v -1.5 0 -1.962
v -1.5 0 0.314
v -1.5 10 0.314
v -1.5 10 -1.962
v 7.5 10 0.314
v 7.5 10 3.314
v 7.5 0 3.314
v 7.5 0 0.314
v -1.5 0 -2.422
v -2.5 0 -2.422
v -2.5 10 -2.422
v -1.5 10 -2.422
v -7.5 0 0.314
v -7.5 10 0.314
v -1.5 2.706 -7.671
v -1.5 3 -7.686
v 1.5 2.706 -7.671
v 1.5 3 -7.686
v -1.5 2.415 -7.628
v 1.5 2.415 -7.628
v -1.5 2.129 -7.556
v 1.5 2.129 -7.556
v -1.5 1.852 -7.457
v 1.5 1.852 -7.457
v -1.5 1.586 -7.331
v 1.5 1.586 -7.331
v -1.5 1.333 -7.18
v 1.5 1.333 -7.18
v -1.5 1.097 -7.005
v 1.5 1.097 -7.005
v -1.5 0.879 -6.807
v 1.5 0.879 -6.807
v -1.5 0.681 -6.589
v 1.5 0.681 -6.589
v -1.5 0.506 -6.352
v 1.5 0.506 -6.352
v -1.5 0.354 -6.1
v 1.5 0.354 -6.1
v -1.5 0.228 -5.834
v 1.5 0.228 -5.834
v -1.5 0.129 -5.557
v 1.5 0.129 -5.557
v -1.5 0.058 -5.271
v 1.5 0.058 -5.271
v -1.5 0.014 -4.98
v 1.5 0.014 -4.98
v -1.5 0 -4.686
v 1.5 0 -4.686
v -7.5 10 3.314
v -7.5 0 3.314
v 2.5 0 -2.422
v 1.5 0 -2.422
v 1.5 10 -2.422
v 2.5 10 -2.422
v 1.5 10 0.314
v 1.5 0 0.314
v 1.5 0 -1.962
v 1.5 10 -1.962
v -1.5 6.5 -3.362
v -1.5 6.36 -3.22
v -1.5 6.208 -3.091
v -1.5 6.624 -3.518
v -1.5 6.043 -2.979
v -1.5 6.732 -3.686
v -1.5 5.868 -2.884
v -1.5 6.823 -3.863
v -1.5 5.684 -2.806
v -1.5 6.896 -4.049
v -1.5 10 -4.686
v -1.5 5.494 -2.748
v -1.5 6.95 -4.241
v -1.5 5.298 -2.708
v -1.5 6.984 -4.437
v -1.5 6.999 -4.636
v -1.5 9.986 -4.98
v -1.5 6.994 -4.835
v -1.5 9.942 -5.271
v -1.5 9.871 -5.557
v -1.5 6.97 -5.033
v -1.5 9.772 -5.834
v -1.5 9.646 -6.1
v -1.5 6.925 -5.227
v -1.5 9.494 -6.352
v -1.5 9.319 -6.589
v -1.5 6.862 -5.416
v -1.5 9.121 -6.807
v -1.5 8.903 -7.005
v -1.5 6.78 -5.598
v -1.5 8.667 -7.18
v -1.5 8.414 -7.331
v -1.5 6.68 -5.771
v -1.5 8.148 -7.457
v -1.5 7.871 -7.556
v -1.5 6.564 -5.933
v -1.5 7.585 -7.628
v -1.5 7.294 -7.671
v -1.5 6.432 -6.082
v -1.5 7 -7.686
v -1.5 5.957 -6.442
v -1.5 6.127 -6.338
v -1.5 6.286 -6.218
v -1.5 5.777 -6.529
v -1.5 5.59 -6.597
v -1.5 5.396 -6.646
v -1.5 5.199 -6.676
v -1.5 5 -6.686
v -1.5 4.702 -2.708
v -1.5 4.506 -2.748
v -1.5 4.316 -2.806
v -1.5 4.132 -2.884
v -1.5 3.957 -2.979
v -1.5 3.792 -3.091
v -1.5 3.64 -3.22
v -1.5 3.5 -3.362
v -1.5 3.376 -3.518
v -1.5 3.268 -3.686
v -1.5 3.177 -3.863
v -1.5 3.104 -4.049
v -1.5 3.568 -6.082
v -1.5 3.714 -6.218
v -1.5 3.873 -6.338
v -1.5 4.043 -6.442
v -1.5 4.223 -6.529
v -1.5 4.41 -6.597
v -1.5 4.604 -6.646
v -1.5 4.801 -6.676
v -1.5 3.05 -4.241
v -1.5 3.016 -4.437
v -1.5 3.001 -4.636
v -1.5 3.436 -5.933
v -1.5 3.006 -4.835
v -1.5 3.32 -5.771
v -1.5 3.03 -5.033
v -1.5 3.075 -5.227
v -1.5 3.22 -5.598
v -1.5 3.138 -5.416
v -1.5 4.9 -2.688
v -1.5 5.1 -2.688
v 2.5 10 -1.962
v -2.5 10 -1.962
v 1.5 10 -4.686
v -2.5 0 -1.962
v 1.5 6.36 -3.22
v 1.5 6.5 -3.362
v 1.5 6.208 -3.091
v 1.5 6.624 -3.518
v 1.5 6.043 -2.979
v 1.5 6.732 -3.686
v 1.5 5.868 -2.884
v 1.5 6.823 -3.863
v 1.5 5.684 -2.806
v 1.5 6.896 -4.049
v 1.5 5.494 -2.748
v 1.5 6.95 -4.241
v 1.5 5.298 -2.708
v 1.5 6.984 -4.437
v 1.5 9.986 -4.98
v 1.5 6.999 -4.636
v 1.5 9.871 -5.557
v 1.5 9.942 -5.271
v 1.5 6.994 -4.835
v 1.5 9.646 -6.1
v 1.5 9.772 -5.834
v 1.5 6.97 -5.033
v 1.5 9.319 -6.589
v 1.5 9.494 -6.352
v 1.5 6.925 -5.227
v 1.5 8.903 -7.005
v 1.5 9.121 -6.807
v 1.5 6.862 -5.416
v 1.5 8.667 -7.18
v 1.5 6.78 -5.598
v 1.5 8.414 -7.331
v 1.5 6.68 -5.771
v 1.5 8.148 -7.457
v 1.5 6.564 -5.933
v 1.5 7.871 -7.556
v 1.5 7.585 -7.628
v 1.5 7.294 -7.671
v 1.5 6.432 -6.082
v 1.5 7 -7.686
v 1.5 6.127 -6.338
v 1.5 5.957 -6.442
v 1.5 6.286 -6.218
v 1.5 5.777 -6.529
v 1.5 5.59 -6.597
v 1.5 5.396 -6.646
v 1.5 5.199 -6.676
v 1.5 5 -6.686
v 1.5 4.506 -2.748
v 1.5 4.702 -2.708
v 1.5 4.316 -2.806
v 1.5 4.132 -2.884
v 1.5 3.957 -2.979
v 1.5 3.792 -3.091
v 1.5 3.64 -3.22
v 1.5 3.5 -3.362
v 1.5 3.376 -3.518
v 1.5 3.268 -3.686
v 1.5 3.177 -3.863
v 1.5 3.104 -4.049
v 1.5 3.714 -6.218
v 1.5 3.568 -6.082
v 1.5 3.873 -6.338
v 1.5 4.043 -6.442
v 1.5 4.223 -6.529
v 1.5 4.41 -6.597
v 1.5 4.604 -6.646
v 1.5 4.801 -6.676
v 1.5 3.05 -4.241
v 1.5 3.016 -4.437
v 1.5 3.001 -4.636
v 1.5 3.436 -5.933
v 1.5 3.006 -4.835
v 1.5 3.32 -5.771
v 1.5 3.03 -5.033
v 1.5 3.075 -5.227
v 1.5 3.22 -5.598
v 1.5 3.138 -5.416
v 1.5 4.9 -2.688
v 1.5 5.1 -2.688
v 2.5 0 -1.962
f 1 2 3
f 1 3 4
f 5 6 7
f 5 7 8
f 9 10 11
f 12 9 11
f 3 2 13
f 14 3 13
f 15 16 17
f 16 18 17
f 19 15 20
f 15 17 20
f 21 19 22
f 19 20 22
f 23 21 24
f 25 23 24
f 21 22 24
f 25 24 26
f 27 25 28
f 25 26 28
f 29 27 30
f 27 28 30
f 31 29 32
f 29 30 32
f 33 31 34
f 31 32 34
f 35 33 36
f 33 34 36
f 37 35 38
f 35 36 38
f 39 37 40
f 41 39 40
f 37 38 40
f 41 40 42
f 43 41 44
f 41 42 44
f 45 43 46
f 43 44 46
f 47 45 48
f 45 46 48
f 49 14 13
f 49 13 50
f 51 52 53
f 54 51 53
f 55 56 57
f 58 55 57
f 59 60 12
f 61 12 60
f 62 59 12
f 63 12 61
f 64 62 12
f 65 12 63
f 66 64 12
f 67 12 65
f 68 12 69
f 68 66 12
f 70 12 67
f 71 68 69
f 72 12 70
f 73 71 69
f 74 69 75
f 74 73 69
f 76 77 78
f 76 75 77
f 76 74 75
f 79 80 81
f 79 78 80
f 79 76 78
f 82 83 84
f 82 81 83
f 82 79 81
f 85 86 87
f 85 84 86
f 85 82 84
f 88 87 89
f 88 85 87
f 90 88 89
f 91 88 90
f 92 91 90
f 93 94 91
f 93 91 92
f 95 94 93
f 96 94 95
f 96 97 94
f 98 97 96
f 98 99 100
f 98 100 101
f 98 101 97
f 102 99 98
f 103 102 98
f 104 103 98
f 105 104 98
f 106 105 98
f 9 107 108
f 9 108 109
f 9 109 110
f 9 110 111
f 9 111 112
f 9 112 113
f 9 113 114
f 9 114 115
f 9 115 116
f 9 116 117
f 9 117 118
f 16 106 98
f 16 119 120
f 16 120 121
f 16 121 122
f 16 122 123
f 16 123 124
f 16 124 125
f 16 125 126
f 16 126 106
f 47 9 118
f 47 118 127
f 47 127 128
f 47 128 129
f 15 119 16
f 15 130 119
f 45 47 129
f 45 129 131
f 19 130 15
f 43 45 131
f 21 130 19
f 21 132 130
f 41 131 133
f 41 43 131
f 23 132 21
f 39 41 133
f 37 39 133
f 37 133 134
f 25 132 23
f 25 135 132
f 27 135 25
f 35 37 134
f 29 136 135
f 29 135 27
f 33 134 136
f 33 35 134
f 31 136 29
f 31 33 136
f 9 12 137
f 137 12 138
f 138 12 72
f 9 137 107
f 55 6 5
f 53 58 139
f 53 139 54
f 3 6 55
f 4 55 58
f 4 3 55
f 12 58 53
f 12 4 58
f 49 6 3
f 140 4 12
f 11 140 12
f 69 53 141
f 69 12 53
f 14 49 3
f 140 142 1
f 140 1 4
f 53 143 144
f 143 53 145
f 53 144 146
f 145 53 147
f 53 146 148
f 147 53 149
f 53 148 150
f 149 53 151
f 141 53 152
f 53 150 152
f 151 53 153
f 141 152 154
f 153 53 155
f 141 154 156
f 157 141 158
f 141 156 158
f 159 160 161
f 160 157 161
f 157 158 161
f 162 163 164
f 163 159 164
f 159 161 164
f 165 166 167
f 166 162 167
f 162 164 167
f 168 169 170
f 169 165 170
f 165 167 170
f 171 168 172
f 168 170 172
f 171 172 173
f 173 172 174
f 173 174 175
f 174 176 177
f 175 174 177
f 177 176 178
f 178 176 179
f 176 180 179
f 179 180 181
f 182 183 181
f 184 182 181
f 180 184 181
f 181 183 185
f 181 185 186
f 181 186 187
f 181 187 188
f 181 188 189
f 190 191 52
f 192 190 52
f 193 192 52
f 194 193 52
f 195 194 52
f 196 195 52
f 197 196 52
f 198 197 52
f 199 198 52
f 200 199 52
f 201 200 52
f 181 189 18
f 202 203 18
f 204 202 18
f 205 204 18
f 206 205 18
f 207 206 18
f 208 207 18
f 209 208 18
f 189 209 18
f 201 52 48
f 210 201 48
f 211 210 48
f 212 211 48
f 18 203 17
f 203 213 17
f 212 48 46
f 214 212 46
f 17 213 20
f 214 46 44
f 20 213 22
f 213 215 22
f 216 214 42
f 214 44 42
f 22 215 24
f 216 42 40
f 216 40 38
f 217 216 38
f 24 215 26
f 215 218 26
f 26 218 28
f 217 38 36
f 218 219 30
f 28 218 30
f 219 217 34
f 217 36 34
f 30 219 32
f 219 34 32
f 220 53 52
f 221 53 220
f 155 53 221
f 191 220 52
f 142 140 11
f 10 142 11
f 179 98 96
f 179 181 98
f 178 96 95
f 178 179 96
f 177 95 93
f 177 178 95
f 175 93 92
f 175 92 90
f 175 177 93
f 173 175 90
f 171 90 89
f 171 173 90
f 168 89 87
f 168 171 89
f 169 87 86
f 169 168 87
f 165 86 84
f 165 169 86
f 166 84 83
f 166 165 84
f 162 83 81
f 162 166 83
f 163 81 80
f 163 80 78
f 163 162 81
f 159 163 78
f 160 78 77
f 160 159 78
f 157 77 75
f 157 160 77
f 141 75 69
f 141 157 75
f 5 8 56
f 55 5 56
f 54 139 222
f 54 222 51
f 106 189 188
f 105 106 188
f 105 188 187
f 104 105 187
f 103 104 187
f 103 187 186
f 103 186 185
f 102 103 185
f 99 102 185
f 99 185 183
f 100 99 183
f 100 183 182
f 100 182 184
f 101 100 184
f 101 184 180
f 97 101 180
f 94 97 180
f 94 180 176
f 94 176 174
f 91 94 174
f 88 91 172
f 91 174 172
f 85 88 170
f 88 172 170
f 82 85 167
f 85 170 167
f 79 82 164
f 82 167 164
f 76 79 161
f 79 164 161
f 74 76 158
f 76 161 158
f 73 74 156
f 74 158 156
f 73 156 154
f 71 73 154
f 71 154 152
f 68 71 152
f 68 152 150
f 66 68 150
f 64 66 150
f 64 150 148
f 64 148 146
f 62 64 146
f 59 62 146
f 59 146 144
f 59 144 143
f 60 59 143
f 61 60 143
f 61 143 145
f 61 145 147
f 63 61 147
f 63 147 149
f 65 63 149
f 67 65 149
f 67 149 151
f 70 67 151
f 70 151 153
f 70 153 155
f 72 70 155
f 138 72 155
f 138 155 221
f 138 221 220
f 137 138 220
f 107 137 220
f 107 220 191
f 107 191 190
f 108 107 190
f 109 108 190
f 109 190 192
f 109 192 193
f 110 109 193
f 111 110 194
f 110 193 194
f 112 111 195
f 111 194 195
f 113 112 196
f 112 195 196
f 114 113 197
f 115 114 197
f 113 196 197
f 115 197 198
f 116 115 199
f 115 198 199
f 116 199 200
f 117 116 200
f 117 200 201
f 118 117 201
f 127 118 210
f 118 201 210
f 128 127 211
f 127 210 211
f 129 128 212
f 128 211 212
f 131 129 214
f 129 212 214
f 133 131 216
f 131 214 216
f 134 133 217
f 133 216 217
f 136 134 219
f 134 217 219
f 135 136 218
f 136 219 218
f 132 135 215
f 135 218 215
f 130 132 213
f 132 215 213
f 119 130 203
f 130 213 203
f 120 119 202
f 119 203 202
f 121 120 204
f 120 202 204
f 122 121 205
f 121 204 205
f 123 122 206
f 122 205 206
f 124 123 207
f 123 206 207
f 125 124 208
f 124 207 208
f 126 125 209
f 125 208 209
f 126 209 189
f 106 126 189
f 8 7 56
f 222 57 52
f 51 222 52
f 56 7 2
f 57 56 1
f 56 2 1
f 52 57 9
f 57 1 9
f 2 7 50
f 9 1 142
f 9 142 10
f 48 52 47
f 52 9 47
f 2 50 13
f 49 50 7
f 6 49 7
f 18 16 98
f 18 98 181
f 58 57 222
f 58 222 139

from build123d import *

# Parameters (mm, degrees)
BOSS_EXTRUDE1_DEPTH      = 10
FILLET1_R                = 3
SKETCH2_R                = 2
CUT_EXTRUDE1_DEPTH       = 10
BOSS_EXTRUDE2_DEPTH      = 1
BOSS_EXTRUDE2_DEPTH_BACK = 4
SKETCH3_W                = 0.460053571
SKETCH3_H                = 10


with BuildPart() as part:
    # Sketch1 → Boss-Extrude1 (new body)
    with BuildSketch(Plane(origin=(0, 0, 0), x_dir=(1, 0, 0), z_dir=(0, 1, 0))):
        Polygon((1.5, 7.685676393), (-1.5, 7.685676393), (-1.5, -0.314323607), (-7.5, -0.314323607), (-7.5, -3.314323607), (7.5, -3.314323607), (7.5, -0.314323607), (1.5, -0.314323607), align=None)
    extrude(amount=BOSS_EXTRUDE1_DEPTH)

    # Fillet1
    fillet1_edges = [part.edges().sort_by_distance(p)[0] for p in [
        (0, 0, -7.685676393),
        (0, 10, -7.685676393),
    ]]
    fillet(fillet1_edges, radius=FILLET1_R)

    # Sketch2 → Cut-Extrude1 (cut)
    with BuildSketch(Plane(origin=(1.5, 0, 0), x_dir=(0, 0, -1), z_dir=(1, 0, 0))):
        with Locations((4.685676393, 5)):
            Circle(SKETCH2_R)
    extrude(amount=-CUT_EXTRUDE1_DEPTH, mode=Mode.SUBTRACT)

    # Sketch3 → Boss-Extrude2 (add, two sides: drawn at the far end of the back side and taken through both)
    with BuildSketch(Plane(origin=(1.5, 0, 0), x_dir=(0, 0, -1), z_dir=(1, 0, 0)).offset(-BOSS_EXTRUDE2_DEPTH_BACK)):
        with Locations((2.192380635, 5)):
            Rectangle(SKETCH3_W, SKETCH3_H)
    extrude(amount=BOSS_EXTRUDE2_DEPTH + BOSS_EXTRUDE2_DEPTH_BACK)


solid = part.part
